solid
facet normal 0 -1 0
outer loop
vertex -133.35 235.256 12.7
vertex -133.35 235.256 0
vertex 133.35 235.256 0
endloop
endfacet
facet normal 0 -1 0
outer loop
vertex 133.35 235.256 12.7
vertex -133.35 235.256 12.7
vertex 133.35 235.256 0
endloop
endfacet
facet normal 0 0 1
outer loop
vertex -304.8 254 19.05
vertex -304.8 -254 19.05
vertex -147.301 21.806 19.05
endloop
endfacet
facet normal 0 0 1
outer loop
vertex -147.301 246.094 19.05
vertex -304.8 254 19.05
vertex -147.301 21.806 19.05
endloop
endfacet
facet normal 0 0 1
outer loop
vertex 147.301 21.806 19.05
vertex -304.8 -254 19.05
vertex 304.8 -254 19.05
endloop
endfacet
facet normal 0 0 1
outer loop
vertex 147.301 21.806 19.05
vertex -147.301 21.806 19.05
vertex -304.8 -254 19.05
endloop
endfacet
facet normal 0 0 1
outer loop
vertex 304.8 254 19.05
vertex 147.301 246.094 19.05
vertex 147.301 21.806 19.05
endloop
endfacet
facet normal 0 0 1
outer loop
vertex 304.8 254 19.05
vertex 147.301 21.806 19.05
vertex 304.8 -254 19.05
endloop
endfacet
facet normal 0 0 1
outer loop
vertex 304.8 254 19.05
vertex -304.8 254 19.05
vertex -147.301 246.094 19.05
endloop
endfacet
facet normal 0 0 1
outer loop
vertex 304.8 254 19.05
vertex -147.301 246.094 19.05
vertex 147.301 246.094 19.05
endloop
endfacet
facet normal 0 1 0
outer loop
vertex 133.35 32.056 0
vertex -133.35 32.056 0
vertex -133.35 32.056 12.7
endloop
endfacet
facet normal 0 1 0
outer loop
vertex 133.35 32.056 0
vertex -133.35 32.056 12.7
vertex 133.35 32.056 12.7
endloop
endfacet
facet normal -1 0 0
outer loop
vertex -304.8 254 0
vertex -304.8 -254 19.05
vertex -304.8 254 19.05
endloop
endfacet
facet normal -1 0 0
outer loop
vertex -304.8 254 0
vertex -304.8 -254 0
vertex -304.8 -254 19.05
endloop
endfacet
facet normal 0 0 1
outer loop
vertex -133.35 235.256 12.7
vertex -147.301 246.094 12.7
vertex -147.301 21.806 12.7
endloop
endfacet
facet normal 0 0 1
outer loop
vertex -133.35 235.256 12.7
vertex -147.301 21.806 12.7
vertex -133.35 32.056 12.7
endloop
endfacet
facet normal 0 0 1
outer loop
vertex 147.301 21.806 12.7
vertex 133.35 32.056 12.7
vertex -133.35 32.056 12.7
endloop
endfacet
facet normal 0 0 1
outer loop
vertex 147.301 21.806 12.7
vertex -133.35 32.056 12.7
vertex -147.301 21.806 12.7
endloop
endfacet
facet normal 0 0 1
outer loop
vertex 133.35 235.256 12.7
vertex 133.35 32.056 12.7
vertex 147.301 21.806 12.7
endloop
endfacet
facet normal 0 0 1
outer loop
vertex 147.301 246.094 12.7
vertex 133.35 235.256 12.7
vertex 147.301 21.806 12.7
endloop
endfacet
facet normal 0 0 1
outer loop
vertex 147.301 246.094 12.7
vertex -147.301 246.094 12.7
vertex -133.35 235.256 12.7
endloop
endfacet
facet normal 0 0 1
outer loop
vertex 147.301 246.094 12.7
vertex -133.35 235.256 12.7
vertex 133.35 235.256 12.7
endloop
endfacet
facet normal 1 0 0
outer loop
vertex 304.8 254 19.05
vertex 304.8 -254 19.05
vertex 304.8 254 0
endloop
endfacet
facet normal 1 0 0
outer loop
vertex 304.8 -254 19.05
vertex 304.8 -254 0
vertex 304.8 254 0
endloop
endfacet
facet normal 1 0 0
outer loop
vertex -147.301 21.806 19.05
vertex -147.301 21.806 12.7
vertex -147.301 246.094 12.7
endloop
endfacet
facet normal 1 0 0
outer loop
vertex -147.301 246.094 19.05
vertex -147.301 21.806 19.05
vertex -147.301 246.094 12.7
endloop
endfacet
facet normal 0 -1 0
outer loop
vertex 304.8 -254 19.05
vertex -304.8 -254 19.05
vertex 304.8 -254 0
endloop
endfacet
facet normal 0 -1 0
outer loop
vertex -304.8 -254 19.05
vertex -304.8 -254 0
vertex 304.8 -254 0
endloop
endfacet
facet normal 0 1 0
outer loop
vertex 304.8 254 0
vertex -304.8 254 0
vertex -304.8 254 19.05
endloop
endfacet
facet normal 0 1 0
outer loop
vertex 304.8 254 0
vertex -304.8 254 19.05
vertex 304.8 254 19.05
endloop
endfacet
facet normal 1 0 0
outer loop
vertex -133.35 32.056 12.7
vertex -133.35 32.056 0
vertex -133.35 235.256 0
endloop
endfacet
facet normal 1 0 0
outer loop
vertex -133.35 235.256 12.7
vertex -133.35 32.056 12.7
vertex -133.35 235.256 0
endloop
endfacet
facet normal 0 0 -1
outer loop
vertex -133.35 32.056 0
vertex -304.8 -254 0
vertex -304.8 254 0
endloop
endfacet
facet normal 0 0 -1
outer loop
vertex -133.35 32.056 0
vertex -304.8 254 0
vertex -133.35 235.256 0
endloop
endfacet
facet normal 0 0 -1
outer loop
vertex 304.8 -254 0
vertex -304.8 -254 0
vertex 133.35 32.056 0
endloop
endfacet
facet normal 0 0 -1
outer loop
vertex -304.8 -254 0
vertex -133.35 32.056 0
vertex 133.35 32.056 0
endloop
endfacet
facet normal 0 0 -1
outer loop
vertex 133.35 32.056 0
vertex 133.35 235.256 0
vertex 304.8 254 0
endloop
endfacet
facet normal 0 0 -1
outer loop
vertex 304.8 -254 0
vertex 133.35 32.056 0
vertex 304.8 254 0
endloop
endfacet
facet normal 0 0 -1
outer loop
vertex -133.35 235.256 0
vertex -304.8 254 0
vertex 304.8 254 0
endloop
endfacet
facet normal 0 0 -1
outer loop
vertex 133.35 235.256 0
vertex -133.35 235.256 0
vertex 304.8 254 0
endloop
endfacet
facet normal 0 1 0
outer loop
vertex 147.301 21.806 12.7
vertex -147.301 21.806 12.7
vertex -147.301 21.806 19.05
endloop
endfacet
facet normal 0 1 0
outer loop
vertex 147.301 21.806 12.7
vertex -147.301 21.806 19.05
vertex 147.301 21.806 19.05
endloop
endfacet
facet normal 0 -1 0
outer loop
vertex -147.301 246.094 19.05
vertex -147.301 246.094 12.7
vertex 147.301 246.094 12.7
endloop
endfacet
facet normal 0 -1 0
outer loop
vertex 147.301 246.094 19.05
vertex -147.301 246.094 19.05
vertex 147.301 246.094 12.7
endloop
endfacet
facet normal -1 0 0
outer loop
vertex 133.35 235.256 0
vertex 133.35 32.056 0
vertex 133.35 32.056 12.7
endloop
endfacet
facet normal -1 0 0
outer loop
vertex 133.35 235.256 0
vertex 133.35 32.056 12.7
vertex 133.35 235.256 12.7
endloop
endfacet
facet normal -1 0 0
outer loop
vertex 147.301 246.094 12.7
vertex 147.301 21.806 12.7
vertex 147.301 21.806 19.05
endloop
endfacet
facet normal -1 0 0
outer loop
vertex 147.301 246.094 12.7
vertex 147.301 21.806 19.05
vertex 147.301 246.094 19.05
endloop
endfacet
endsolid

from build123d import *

# Parameters (mm, degrees)
F0_W     = 609.6
F0_H     = 508
F0_W_2   = 266.7
F0_H_2   = 203.2
F1_DEPTH = 12.7
F2_W     = 609.6
F2_H     = 508
F2_W_2   = 294.601322
F2_H_2   = 224.288658
F3_DEPTH = 6.35


with BuildPart() as f1:
    # F0 (on Top) → F1 (new body)
    with BuildSketch(Plane.XY):
        Rectangle(F0_W, F0_H)
        with Locations((0, 133.655697)):
            Rectangle(F0_W_2, F0_H_2, mode=Mode.SUBTRACT)
    extrude(amount=F1_DEPTH)

    # F2 (on face) → F3 (join)
    with BuildSketch(Plane.XY.offset(12.7)):
        Rectangle(F2_W, F2_H)
        with Locations((0, 133.950159)):
            Rectangle(F2_W_2, F2_H_2, mode=Mode.SUBTRACT)
    extrude(amount=F3_DEPTH)


solid = f1.part
